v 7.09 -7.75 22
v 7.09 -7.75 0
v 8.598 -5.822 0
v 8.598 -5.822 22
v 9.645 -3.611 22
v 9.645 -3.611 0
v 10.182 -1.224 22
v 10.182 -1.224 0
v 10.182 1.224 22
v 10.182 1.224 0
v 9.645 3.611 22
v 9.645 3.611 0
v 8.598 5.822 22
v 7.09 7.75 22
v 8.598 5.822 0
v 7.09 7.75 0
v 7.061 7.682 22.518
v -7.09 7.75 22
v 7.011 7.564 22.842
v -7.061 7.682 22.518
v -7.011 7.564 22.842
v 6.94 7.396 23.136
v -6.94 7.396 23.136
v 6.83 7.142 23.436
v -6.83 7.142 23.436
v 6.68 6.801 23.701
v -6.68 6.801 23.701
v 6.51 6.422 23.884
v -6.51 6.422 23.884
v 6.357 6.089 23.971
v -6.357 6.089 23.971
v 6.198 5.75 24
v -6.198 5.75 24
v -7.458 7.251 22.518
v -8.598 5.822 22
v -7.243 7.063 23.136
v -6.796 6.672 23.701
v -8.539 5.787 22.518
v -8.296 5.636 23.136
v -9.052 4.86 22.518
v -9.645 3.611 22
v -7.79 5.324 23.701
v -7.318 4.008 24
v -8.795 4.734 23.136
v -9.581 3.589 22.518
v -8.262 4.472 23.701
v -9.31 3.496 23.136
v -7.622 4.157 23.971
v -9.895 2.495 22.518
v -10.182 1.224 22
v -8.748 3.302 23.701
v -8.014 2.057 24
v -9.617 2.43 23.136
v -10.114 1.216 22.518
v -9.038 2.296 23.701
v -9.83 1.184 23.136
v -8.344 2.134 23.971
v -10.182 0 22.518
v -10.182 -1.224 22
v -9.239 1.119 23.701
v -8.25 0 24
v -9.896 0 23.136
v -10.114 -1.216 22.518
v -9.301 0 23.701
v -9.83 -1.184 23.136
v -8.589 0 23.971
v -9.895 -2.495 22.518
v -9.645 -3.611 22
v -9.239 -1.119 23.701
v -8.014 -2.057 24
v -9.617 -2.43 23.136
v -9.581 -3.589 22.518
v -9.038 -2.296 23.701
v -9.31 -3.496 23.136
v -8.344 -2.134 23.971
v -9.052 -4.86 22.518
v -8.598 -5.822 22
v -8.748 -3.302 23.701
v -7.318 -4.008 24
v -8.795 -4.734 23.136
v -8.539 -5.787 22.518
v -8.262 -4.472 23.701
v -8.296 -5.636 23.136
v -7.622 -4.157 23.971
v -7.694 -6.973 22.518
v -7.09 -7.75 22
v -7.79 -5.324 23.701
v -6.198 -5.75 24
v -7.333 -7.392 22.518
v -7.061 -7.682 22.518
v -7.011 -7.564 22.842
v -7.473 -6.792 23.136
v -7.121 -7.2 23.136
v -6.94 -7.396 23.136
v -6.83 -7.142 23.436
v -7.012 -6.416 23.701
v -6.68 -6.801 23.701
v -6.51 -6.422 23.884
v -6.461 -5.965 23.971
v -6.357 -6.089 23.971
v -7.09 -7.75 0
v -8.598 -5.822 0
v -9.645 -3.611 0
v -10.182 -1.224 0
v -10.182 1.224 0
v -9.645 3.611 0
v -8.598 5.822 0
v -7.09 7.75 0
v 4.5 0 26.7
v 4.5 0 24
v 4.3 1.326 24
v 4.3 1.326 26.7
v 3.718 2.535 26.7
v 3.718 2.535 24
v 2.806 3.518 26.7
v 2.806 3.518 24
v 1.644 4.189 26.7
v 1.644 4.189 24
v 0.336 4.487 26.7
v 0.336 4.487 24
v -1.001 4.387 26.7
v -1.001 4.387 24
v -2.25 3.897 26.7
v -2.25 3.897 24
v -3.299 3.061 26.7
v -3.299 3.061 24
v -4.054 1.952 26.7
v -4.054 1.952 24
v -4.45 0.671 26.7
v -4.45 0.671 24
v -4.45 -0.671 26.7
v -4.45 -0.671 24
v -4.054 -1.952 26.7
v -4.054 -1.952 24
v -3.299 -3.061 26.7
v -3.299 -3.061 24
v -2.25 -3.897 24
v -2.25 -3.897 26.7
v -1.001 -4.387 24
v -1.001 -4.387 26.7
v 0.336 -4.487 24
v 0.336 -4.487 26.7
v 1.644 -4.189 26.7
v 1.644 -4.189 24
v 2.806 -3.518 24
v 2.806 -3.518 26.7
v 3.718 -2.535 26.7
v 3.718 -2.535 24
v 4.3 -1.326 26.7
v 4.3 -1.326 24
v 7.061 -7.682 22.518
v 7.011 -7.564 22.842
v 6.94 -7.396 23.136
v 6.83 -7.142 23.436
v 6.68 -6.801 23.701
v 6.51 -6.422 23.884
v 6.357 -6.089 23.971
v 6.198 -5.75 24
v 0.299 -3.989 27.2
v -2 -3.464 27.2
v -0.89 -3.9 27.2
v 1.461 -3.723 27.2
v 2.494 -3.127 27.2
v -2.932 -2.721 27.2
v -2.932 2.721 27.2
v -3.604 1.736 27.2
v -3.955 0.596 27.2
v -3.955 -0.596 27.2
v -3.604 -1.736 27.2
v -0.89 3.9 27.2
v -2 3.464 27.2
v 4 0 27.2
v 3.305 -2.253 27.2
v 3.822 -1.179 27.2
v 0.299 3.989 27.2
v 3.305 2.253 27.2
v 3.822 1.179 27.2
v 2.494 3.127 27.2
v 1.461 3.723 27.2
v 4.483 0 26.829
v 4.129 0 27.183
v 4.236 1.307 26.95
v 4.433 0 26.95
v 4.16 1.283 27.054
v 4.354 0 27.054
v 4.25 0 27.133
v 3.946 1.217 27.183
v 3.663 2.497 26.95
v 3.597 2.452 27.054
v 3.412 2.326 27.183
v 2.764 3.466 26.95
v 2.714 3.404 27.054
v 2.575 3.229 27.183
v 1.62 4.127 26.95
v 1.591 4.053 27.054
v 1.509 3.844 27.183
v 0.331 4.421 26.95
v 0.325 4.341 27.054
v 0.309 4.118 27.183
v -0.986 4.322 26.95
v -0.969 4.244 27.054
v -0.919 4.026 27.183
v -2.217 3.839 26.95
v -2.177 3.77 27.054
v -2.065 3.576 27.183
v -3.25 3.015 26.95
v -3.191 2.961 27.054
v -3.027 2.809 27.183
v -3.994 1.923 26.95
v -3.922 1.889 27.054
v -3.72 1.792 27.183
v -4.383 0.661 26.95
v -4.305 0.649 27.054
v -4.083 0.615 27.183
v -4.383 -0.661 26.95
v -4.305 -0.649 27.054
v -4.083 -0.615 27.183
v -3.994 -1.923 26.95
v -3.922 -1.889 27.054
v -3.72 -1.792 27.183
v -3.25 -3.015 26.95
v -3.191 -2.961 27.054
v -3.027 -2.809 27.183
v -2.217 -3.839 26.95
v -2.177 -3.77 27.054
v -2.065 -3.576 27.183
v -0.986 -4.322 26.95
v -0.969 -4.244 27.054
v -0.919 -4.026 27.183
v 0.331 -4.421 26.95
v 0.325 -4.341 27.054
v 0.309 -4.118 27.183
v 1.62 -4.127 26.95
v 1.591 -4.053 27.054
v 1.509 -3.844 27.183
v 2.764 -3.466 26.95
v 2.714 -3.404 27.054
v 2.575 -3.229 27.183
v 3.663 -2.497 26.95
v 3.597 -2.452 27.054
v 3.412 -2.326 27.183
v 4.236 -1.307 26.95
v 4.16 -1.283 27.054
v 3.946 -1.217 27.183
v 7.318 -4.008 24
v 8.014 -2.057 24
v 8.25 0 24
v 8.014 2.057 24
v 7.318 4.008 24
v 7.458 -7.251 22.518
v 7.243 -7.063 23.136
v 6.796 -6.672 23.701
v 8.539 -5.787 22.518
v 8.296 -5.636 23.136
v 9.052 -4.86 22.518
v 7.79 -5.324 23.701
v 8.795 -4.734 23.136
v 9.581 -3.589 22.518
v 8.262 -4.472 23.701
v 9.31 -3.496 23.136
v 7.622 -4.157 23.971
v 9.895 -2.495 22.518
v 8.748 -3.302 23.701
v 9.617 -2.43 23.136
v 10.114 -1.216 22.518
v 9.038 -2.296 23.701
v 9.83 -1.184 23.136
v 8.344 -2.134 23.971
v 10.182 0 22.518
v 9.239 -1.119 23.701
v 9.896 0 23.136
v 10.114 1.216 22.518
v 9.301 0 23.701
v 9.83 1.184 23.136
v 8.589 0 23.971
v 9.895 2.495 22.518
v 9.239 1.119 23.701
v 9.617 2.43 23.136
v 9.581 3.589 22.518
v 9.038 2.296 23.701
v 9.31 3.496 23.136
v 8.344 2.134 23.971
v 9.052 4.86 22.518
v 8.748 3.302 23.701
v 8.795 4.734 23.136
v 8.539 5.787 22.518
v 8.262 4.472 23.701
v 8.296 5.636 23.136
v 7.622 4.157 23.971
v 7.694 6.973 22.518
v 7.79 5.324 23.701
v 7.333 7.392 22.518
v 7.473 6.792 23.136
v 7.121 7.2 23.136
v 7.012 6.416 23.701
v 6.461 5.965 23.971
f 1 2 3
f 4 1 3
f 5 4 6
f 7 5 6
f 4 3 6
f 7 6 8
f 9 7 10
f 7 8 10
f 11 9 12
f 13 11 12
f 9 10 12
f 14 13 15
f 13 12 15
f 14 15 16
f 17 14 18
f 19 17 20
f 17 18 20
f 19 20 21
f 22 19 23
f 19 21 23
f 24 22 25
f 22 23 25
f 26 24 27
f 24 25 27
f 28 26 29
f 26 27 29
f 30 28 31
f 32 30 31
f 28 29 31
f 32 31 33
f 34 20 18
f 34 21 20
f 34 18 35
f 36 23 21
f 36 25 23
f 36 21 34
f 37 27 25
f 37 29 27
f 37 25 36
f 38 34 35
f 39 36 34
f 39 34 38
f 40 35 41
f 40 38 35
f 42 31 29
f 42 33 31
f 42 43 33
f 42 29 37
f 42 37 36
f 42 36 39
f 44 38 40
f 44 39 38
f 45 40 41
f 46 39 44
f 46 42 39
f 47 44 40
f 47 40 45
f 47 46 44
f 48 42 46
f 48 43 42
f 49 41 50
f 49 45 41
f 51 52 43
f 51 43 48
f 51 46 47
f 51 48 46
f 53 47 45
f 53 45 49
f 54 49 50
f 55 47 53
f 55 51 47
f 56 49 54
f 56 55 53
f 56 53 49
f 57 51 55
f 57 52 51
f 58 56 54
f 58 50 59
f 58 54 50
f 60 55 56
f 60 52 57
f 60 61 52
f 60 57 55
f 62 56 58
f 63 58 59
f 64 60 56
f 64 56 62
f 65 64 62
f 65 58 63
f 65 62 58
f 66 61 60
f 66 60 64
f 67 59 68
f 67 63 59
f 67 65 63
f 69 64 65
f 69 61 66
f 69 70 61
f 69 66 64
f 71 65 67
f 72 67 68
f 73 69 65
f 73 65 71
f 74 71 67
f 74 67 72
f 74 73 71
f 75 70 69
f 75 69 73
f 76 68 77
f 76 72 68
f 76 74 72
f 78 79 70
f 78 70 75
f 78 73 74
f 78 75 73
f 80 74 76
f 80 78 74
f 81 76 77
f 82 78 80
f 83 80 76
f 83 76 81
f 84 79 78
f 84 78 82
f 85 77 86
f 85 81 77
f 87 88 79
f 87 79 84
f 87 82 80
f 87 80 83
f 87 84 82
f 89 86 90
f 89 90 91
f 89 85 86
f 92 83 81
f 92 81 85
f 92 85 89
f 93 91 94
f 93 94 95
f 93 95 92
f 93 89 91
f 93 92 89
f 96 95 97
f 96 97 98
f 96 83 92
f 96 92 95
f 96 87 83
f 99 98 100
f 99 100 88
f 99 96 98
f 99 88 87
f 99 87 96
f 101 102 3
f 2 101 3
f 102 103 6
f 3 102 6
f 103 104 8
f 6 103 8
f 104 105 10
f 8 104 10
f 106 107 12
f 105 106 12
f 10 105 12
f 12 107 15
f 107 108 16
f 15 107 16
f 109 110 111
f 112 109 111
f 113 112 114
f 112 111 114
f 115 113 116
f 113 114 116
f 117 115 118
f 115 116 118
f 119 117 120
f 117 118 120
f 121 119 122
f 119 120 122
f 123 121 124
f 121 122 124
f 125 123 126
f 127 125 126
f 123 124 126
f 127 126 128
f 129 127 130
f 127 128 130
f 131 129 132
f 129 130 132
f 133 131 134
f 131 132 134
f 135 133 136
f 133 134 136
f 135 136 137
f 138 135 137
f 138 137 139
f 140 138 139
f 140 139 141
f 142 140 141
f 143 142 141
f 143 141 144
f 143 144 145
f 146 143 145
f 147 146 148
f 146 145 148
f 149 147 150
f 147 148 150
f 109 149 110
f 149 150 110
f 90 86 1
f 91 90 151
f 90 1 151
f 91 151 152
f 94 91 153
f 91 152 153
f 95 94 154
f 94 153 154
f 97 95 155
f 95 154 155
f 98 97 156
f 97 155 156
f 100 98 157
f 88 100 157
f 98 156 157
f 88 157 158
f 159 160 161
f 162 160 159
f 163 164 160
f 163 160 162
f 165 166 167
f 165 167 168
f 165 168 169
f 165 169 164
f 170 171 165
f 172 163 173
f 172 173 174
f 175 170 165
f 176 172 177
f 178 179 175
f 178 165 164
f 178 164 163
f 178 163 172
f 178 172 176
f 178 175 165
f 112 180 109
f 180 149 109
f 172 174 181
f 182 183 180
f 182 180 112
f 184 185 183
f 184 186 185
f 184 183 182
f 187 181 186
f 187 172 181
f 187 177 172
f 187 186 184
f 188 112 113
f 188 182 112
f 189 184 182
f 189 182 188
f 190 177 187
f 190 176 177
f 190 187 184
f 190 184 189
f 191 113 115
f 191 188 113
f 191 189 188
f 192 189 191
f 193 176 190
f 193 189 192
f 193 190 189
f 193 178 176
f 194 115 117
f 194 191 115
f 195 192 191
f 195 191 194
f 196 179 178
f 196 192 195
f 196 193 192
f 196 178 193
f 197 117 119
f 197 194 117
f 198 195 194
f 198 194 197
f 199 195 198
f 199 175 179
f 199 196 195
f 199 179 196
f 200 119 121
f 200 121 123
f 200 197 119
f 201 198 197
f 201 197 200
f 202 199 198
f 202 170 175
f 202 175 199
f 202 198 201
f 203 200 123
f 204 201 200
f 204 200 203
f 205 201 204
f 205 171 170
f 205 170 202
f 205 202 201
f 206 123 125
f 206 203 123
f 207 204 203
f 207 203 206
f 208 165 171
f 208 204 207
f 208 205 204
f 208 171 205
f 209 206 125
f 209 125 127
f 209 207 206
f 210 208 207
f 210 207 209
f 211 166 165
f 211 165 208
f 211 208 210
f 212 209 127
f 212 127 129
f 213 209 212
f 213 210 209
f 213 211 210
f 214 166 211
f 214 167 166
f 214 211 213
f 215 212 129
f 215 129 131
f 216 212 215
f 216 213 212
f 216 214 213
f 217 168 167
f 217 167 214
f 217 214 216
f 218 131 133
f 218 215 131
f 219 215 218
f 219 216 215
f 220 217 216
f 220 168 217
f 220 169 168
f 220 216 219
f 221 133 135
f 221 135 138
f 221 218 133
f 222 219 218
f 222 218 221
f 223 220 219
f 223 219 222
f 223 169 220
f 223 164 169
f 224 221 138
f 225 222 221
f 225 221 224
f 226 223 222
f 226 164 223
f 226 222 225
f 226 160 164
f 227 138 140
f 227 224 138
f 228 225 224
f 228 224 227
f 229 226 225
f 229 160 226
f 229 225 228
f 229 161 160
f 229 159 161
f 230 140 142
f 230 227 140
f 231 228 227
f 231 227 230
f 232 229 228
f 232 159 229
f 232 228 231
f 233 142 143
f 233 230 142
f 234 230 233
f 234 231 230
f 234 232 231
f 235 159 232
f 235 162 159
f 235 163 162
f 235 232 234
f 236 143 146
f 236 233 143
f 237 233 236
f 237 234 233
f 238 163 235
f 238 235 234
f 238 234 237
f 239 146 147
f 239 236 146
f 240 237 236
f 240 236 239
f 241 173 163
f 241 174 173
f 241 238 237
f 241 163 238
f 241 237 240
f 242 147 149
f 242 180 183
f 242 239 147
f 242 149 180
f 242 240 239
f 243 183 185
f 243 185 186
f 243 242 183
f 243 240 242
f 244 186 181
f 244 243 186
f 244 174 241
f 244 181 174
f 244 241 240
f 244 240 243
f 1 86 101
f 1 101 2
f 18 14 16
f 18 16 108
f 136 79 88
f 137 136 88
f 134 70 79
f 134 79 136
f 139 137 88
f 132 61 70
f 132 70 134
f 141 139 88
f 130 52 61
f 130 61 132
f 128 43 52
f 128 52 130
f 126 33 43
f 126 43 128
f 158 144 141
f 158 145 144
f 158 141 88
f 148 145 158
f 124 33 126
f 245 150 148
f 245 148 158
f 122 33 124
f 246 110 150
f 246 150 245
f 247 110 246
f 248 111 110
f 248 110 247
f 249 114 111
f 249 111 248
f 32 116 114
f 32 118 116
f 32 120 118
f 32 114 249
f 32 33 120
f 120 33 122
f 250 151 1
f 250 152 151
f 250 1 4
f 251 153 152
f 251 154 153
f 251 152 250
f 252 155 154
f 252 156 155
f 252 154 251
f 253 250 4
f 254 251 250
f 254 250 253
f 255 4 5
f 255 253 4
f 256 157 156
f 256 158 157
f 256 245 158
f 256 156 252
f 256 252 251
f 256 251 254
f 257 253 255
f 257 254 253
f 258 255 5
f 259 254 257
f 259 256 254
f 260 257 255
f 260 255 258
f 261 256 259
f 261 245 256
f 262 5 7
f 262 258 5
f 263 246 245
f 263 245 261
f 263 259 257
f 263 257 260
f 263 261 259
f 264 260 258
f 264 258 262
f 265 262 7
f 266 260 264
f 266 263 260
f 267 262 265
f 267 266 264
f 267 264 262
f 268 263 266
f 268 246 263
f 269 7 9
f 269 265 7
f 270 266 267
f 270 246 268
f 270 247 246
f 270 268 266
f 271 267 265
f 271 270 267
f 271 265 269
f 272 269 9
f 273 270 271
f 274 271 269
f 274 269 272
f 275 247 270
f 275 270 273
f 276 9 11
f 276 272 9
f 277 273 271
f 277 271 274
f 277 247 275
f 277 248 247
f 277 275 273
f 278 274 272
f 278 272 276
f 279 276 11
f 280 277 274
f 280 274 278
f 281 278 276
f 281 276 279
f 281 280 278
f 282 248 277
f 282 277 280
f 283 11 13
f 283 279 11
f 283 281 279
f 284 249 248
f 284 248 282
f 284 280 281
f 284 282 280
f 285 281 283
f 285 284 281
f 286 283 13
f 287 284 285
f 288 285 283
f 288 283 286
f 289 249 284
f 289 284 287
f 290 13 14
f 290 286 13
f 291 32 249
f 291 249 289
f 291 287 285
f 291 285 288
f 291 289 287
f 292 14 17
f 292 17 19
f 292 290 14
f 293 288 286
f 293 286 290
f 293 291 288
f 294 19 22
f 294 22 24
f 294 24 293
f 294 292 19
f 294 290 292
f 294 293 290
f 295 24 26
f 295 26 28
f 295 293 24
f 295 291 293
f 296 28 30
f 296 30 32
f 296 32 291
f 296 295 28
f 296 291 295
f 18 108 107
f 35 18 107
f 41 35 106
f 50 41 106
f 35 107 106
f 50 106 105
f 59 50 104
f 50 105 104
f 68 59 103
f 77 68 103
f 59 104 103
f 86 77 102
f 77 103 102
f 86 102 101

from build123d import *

# Parameters (mm, degrees)
SALIENTE_EXTRUIR1_DEPTH = 24
REDONDEO1_R             = 2
CROQUIS2_R              = 4.5
SALIENTE_EXTRUIR2_DEPTH = 3.2
REDONDEO2_R             = 0.5


with BuildPart() as part:
    # Croquis1 → Saliente-Extruir1 (new body)
    with BuildSketch(Plane.XY):
        with BuildLine():
            Line((7.09, 7.75), (-7.09, 7.75))
            ThreePointArc((-7.09, 7.75), (-10.25, 0), (-7.09, -7.75))
            Line((-7.09, -7.75), (7.09, -7.75))
            ThreePointArc((7.09, -7.75), (10.25, 0), (7.09, 7.75))
        make_face()
    extrude(amount=SALIENTE_EXTRUIR1_DEPTH)

    # Redondeo1
    redondeo1_edges = [part.edges().sort_by_distance(p)[0] for p in [
        (10.25, 0, 24),
        (0, 7.75, 24),
        (-10.25, 0, 24),
        (0, -7.75, 24),
    ]]
    fillet(redondeo1_edges, radius=REDONDEO1_R)

    # Croquis2 → Saliente-Extruir2 (add)
    with BuildSketch(Plane.XY.offset(24)):
        Circle(CROQUIS2_R)
    extrude(amount=SALIENTE_EXTRUIR2_DEPTH)

    # Redondeo2
    redondeo2_edges = [part.edges().sort_by_distance(p)[0] for p in [
        (-4.5, 0, 27.2),
    ]]
    fillet(redondeo2_edges, radius=REDONDEO2_R)


solid = part.part
